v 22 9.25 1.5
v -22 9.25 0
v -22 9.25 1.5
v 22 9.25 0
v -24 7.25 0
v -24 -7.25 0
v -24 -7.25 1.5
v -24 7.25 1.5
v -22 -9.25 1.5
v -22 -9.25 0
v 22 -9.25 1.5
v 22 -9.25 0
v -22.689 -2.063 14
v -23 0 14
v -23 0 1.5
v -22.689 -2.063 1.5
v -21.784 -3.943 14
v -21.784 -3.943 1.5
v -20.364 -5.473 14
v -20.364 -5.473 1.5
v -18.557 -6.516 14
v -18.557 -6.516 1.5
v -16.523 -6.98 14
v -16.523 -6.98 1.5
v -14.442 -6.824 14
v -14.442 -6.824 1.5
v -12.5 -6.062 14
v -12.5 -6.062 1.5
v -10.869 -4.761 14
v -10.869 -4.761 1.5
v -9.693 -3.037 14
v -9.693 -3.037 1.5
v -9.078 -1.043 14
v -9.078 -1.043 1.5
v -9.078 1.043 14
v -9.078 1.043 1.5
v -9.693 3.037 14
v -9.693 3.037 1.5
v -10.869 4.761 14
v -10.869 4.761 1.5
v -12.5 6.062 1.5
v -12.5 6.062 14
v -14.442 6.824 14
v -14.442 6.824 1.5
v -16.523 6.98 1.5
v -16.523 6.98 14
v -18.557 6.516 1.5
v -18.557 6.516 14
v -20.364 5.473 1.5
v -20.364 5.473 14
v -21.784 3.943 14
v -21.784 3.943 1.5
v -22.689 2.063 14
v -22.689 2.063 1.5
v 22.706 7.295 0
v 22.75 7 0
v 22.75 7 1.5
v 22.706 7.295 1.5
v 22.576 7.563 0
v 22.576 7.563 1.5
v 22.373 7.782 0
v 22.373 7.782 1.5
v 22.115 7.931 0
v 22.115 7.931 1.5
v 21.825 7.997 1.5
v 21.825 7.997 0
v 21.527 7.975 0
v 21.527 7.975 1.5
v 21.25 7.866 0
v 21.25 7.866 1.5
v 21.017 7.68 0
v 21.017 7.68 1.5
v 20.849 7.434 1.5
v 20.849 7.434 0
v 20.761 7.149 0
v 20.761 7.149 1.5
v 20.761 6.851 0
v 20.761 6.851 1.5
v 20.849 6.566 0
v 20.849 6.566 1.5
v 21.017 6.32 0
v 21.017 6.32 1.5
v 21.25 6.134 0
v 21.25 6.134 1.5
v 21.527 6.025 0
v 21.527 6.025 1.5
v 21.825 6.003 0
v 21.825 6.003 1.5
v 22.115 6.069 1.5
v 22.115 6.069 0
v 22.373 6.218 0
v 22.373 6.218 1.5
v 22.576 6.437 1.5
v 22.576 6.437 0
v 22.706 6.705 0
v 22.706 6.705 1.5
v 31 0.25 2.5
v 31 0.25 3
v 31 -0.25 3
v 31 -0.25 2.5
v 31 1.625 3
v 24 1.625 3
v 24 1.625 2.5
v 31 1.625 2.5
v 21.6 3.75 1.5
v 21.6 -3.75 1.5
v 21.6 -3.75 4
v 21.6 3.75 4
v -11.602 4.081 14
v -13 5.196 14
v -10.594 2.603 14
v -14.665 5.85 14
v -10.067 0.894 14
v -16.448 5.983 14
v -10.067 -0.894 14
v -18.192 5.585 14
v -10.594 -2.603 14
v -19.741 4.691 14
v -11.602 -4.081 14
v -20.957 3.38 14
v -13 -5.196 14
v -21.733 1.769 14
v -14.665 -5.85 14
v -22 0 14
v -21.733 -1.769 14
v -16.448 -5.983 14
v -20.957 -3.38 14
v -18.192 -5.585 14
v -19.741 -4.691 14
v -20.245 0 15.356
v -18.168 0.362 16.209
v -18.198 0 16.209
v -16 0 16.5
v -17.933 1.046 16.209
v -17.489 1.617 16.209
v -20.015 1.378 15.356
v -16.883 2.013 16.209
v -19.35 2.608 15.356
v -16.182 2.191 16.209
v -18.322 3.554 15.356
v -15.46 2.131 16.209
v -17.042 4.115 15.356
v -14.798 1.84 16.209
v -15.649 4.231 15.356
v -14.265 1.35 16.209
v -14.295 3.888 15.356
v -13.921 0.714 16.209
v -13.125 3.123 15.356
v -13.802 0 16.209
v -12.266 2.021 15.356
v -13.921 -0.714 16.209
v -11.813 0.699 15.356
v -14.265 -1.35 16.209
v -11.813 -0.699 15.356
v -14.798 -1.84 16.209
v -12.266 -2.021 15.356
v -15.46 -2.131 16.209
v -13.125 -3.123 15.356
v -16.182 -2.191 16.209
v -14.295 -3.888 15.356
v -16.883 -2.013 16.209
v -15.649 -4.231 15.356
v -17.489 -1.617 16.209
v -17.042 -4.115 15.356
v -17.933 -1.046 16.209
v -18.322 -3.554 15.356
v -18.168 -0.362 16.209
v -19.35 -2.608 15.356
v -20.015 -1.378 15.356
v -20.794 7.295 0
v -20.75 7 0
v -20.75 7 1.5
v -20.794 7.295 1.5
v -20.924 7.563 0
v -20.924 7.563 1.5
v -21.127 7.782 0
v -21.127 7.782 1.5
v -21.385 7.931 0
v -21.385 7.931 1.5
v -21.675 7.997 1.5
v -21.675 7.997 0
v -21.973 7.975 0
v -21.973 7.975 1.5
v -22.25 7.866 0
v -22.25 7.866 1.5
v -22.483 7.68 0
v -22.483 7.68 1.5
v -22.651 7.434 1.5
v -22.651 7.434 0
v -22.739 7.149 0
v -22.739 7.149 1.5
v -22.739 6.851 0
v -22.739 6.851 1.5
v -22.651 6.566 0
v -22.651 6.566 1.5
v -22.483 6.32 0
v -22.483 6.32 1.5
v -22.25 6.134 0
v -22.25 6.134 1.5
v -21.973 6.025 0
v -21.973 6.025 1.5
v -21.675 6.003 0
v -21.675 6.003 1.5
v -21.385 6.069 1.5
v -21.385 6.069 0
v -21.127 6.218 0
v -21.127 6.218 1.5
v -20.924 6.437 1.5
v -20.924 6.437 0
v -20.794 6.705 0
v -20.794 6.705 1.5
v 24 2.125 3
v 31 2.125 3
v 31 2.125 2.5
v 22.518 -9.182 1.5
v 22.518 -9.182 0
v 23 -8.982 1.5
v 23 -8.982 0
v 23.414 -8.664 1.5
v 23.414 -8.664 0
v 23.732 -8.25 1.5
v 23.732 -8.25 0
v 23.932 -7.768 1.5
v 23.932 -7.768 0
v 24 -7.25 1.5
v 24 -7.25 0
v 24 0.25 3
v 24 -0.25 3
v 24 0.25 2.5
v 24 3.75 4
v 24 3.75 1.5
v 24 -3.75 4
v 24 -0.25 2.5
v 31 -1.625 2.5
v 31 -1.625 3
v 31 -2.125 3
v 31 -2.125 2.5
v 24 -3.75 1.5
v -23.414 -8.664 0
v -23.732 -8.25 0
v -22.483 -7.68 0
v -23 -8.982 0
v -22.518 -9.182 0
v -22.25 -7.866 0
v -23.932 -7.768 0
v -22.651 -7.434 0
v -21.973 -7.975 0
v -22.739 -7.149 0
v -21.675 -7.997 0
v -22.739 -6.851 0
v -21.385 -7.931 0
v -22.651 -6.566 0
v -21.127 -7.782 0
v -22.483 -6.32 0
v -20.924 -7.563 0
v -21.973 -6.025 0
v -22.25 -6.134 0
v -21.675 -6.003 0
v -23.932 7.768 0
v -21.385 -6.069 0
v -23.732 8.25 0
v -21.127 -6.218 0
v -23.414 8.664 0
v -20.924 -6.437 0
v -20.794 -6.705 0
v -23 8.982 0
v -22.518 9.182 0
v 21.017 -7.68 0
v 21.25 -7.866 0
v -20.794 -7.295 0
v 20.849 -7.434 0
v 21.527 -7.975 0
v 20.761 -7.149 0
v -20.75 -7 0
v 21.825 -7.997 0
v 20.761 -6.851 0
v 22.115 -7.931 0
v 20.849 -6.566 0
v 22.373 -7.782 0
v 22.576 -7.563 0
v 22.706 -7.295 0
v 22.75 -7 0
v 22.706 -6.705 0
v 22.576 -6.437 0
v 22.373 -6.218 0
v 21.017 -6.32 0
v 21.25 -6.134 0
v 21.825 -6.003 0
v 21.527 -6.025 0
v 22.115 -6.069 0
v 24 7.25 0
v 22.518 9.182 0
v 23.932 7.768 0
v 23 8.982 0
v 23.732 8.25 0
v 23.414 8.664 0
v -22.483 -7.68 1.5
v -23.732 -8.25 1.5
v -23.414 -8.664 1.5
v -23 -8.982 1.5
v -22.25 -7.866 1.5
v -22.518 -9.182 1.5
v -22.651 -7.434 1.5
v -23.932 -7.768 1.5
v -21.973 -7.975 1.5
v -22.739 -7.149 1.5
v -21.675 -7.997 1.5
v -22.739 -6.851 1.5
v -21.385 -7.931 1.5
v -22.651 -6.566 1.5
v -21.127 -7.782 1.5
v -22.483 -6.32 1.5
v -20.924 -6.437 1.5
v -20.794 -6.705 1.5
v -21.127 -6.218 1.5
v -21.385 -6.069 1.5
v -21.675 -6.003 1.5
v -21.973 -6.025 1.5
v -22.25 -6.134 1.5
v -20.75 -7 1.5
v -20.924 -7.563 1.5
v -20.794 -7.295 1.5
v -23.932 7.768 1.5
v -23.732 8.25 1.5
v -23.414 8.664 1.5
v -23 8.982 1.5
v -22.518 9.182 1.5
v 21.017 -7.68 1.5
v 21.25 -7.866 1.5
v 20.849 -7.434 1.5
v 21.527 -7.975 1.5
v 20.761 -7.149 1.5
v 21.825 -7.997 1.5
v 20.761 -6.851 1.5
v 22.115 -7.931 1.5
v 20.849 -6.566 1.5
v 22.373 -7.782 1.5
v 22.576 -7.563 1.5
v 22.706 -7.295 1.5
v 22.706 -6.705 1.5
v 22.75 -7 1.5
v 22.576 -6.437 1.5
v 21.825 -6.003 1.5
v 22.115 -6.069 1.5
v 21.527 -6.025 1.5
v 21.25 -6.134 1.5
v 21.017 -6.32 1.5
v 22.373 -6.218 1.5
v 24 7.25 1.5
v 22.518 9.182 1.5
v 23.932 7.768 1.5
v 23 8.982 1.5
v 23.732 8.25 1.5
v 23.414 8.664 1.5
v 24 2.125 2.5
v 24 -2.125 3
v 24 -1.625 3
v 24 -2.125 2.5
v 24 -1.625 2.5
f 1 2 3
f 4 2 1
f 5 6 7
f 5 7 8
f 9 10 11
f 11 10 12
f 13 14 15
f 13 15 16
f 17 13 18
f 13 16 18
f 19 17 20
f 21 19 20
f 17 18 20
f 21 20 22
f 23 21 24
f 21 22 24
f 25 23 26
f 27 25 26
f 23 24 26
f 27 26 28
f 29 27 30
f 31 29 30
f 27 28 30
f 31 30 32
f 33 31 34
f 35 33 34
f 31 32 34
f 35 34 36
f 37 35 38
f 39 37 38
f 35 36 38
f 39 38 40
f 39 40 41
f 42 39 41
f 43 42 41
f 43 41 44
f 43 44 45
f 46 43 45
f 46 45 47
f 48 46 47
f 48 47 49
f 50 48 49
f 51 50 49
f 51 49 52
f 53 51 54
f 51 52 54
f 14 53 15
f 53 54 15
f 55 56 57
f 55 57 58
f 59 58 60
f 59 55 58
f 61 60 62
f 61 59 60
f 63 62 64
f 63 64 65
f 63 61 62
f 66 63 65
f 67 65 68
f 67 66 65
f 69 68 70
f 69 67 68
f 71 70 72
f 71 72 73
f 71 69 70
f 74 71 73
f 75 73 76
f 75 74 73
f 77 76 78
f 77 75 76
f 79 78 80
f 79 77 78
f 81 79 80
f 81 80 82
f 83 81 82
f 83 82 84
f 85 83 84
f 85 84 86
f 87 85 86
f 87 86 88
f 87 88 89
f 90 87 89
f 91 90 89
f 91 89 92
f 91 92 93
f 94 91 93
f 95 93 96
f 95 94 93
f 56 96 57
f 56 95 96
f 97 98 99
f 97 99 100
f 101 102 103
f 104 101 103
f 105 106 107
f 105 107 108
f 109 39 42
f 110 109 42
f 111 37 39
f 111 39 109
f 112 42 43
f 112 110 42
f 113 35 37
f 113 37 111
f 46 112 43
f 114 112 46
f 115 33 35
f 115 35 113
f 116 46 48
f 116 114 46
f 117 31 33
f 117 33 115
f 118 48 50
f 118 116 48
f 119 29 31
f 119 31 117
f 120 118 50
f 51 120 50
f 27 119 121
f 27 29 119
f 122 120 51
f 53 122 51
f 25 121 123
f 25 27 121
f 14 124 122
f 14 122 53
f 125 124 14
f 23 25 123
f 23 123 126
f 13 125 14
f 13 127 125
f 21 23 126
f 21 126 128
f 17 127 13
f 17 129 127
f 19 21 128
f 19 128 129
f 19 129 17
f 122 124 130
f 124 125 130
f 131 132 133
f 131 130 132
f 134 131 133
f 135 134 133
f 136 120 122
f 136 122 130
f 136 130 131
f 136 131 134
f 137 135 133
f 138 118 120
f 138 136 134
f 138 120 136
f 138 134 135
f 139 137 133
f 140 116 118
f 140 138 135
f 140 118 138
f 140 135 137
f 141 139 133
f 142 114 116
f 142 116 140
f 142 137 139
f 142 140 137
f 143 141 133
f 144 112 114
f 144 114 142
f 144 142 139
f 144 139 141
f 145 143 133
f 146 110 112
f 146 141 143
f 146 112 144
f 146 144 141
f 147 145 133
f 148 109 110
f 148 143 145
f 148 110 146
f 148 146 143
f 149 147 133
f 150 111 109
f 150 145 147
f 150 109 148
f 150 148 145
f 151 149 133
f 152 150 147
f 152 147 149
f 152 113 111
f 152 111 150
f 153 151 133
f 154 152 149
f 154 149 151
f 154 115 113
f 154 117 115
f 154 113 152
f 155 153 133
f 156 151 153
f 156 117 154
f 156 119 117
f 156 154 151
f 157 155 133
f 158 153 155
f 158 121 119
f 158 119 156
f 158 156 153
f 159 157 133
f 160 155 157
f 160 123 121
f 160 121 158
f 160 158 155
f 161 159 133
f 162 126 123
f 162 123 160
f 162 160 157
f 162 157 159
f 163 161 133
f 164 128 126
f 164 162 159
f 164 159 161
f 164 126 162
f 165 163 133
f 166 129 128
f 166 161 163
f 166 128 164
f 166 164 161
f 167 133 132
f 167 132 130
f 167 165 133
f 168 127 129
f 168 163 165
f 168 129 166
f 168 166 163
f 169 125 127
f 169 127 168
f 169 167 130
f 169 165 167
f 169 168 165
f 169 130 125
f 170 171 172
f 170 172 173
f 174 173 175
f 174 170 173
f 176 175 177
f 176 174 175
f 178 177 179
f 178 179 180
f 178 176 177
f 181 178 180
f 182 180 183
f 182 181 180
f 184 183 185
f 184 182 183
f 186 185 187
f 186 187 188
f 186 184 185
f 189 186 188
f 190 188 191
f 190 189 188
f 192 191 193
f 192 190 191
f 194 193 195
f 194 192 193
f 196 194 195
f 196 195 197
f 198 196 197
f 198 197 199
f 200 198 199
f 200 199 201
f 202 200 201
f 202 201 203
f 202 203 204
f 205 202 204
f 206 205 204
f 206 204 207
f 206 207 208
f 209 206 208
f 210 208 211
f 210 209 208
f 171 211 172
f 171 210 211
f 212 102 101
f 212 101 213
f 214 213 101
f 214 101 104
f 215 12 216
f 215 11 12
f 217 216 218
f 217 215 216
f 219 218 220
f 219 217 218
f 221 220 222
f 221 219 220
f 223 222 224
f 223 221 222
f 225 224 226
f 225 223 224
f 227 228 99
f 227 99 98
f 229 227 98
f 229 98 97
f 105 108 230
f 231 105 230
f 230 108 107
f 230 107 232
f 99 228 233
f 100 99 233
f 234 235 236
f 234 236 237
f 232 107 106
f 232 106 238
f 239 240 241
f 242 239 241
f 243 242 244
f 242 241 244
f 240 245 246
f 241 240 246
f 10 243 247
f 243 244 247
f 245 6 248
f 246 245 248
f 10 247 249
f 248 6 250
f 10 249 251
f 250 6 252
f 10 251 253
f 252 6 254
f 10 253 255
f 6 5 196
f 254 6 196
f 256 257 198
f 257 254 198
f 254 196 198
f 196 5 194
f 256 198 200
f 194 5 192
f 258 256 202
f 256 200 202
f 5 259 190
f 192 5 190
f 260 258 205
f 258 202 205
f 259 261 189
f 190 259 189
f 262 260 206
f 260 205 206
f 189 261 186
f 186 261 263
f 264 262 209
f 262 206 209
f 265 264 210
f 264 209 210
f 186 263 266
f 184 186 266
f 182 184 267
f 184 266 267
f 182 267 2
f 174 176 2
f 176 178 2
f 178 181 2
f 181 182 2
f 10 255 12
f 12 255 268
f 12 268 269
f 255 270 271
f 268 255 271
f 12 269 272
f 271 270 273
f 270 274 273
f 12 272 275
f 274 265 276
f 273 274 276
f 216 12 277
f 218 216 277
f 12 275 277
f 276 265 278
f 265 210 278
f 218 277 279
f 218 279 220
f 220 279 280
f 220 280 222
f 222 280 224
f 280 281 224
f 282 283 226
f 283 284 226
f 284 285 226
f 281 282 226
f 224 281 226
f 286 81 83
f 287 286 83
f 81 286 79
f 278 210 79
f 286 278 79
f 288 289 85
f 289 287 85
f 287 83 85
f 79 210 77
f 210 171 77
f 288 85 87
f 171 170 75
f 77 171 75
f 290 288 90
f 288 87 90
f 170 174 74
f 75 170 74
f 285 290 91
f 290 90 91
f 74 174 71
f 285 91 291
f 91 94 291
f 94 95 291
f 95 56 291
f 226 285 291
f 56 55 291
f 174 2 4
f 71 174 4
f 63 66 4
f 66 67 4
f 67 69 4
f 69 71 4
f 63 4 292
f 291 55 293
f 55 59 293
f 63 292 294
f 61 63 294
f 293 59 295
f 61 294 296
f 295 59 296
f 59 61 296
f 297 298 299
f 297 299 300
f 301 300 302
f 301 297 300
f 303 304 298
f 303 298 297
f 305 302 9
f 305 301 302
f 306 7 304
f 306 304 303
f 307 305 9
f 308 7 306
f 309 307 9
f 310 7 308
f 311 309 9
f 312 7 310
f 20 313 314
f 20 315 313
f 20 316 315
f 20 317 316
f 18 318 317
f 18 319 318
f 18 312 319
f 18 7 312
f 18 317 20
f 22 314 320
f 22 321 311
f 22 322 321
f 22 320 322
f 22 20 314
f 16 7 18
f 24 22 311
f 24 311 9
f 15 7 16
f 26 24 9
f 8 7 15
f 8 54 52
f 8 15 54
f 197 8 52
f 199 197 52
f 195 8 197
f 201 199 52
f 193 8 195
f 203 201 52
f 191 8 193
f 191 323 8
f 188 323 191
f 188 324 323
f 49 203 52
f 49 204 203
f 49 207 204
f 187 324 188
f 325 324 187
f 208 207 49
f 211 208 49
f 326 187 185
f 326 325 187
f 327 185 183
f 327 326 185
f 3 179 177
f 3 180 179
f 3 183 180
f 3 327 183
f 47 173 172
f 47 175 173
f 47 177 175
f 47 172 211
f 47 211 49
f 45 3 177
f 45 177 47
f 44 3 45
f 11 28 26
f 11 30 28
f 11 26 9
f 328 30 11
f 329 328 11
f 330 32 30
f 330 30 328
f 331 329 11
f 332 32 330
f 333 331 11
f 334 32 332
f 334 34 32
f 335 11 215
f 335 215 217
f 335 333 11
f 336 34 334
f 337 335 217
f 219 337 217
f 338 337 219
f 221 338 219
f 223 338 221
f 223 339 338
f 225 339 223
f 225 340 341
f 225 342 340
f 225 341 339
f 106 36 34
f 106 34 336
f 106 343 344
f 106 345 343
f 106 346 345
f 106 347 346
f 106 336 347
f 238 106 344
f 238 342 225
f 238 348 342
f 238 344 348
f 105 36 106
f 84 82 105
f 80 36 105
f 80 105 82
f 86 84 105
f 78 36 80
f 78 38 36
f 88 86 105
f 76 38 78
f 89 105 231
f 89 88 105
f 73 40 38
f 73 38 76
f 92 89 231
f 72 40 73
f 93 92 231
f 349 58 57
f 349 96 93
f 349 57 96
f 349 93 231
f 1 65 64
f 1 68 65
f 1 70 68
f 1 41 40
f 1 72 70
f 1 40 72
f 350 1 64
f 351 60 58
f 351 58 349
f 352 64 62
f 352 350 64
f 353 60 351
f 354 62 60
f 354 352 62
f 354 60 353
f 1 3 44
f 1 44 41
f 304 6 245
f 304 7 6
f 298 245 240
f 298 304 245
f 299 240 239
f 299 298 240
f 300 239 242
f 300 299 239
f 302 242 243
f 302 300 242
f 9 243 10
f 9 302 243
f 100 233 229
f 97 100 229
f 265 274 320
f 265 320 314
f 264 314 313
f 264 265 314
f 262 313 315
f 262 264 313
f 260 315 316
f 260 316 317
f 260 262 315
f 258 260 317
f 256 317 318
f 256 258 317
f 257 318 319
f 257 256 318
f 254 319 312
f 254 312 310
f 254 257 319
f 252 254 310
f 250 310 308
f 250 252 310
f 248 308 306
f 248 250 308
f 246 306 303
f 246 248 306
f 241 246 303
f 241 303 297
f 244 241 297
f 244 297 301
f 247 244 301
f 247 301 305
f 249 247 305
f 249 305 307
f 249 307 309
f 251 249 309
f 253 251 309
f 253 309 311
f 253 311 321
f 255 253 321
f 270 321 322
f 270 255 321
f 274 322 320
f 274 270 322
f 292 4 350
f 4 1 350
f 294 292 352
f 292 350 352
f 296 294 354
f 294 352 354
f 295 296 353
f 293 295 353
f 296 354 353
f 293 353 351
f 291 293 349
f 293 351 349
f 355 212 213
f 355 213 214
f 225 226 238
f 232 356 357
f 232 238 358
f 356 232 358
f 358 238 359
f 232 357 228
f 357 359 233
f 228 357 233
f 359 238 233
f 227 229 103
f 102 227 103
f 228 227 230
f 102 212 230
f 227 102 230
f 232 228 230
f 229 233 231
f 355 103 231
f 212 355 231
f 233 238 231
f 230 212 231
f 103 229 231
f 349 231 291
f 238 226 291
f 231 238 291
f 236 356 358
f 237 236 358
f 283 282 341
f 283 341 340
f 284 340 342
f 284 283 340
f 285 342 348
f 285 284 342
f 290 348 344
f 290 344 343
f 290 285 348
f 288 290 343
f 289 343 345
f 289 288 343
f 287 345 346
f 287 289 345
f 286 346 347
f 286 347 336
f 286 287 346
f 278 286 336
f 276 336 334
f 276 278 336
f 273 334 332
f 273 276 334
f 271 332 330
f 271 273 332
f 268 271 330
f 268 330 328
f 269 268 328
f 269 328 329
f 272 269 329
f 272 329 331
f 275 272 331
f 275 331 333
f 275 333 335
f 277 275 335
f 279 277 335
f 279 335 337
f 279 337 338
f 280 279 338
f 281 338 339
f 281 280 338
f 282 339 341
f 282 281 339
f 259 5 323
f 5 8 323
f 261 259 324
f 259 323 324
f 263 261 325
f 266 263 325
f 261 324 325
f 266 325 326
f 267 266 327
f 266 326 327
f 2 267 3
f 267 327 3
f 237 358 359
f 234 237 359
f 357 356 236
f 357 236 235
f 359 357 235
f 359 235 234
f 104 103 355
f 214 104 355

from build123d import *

# Parameters (mm, degrees)
SKETCH1_W           = 48
SKETCH1_H           = 18.5
SKETCH1_R           = 1
BOSS_EXTRUDE1_DEPTH = 1.5
FILLET1_R           = 2
SKETCH2_R           = 7
BOSS_EXTRUDE2_DEPTH = 12.5
SKETCH5_W           = 2.4
SKETCH5_H           = 7.5
BOSS_EXTRUDE3_DEPTH = 2.5
SKETCH6_W           = 0.5
SKETCH6_H           = 0.5
BOSS_EXTRUDE4_DEPTH = 7


with BuildPart() as part:
    # Sketch1 → Boss-Extrude1 (new body)
    with BuildSketch(Plane.XY):
        Rectangle(SKETCH1_W, SKETCH1_H)
        with Locations((-21.75, 7)):
            Circle(SKETCH1_R, mode=Mode.SUBTRACT)
        with Locations((21.75, 7)):
            Circle(SKETCH1_R, mode=Mode.SUBTRACT)
        with Locations((21.75, -7)):
            Circle(SKETCH1_R, mode=Mode.SUBTRACT)
        with Locations((-21.75, -7)):
            Circle(SKETCH1_R, mode=Mode.SUBTRACT)
    extrude(amount=BOSS_EXTRUDE1_DEPTH)

    # Fillet1
    fillet1_edges = [part.edges().sort_by_distance(p)[0] for p in [
        (24, -9.25, 0.75),
        (-24, -9.25, 0.75),
        (-24, 9.25, 0.75),
        (24, 9.25, 0.75),
    ]]
    fillet(fillet1_edges, radius=FILLET1_R)

    # Sketch2 → Boss-Extrude2 (add)
    with BuildSketch(Plane.XY.offset(1.5)):
        with Locations(Location((-16, 0, 0), (0, 0, 180))):
            Circle(SKETCH2_R)
    extrude(amount=BOSS_EXTRUDE2_DEPTH)

    # Sketch3 → Revolve3 (revolve)
    with BuildSketch(Plane(origin=(0, 0, 0), x_dir=(-1, 0, 0), z_dir=(0, -1, 0))):
        with BuildLine():
            Line((16, -14), (16, -16.5))
            ThreePointArc((16, -16.5), (19.25, -15.85), (22, -14))
            Line((22, -14), (16, -14))
        make_face()
    revolve(axis=Axis((-16, 0, 1014), (0, 0, -1)))

    # Sketch5 → Boss-Extrude3 (add)
    with BuildSketch(Plane.XY.offset(1.5)):
        with Locations((22.8, 0)):
            Rectangle(SKETCH5_W, SKETCH5_H)
    extrude(amount=BOSS_EXTRUDE3_DEPTH)

    # Sketch6 → Boss-Extrude4 (add)
    with BuildSketch(Plane(origin=(24, 0, 0), x_dir=(0, 0, -1), z_dir=(1, 0, 0))):
        with Locations((-2.75, 1.875)):
            Rectangle(SKETCH6_W, SKETCH6_H)
        with Locations((-2.75, 0)):
            Rectangle(SKETCH6_W, SKETCH6_H)
        with Locations((-2.75, -1.875)):
            Rectangle(SKETCH6_W, SKETCH6_H)
    extrude(amount=BOSS_EXTRUDE4_DEPTH)


solid = part.part
